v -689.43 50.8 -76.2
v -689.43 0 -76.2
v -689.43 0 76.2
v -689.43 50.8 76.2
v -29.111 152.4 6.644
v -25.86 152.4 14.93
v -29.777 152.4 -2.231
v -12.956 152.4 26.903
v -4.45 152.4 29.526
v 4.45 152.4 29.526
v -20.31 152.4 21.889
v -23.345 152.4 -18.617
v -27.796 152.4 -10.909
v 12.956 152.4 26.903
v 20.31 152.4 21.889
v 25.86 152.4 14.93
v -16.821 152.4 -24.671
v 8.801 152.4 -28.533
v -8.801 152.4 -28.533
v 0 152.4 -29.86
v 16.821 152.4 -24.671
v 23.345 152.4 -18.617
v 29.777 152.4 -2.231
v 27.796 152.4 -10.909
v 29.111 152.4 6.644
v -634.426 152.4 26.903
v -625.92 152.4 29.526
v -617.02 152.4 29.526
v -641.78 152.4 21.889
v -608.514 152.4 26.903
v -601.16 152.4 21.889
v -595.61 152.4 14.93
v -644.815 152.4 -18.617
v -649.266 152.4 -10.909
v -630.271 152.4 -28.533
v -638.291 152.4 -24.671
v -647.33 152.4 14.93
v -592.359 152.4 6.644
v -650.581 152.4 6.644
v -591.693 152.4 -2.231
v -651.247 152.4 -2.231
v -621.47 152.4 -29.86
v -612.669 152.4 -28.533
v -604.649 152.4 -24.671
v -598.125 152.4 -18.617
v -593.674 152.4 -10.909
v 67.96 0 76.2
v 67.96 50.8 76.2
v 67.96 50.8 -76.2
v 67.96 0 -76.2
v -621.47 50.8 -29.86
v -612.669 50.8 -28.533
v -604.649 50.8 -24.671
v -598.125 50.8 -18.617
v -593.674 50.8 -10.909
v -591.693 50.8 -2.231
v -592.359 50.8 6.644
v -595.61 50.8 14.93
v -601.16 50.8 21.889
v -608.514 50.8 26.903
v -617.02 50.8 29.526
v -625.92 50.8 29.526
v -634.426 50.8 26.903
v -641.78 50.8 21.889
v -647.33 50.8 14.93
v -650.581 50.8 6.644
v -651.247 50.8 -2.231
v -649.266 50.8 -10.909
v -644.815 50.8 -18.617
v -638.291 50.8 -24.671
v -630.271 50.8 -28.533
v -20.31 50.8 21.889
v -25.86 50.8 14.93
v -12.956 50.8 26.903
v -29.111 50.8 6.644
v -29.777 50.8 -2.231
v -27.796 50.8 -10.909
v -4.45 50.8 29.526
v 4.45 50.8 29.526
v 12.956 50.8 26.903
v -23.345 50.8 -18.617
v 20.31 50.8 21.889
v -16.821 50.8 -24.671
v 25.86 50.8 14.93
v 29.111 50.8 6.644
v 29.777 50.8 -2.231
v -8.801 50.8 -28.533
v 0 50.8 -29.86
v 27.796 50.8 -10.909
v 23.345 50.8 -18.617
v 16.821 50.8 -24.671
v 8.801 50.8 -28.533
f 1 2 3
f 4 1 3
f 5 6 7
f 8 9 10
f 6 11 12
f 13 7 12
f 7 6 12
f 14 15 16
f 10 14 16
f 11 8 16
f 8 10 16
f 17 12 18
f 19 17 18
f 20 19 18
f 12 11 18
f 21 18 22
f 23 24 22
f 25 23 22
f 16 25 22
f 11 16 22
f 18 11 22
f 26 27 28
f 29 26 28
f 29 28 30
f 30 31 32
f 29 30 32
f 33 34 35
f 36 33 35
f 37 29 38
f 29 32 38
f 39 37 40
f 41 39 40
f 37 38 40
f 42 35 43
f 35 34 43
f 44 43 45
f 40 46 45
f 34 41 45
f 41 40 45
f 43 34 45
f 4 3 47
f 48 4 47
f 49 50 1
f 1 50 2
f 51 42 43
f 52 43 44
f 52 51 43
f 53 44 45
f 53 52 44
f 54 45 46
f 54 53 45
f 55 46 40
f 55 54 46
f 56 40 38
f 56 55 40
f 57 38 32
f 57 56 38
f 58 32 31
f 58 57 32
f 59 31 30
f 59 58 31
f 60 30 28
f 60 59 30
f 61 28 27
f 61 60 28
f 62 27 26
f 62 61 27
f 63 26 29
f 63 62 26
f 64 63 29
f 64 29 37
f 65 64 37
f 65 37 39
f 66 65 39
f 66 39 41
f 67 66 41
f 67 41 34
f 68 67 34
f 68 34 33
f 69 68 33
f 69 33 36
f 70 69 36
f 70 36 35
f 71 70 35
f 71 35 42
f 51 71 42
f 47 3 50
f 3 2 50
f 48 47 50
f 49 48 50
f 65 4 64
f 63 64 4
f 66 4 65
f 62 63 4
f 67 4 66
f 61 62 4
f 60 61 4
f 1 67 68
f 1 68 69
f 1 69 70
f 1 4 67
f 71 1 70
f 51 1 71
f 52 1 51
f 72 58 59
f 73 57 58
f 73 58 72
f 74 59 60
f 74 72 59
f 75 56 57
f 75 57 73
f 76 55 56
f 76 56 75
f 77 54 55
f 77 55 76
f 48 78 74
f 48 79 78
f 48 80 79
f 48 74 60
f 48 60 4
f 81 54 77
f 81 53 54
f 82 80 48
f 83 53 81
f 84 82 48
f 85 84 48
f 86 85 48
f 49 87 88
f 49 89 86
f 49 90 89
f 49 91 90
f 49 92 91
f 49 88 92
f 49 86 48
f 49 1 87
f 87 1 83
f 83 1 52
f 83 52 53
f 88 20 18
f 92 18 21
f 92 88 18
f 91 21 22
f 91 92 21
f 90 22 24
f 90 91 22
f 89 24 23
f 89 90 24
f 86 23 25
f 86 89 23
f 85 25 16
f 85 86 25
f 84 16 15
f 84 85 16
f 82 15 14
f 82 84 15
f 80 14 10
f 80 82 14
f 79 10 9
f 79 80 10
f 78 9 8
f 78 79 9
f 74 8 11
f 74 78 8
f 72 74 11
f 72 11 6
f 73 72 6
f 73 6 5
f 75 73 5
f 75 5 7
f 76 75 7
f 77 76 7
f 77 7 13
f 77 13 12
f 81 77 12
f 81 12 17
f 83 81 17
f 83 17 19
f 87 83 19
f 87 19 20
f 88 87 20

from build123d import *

# Parameters (mm, degrees)
BOSS_EXTRUDE1_DEPTH = 50.8
SKETCH2_R           = 29.86
BOSS_EXTRUDE2_DEPTH = 152.4


with BuildPart() as part:
    # Sketch1 → Boss-Extrude1 (new body)
    with BuildSketch(Plane(origin=(0, 0, 0), x_dir=(1, 0, 0), z_dir=(0, 1, 0))):
        with BuildLine():
            Line((67.96, 0), (29.86, 0))
            ThreePointArc((29.86, 0), (0, -29.86), (-29.86, 0))
            Line((-29.86, 0), (-591.61, 0))
            ThreePointArc((-591.61, 0), (-621.47, -29.86), (-651.33, 0))
            Line((-651.33, 0), (-689.43, 0))
            Line((-689.43, 0), (-689.43, -76.2))
            Line((-689.43, -76.2), (67.96, -76.2))
            Line((67.96, -76.2), (67.96, 0))
        make_face()
        with BuildLine():
            ThreePointArc((-29.86, 0), (0, 29.86), (29.86, 0))
            Line((29.86, 0), (67.96, 0))
            Line((67.96, 0), (67.96, 76.2))
            Line((67.96, 76.2), (-689.43, 76.2))
            Line((-689.43, 76.2), (-689.43, 0))
            Line((-689.43, 0), (-651.33, 0))
            ThreePointArc((-651.33, 0), (-621.47, 29.86), (-591.61, 0))
            Line((-591.61, 0), (-29.86, 0))
        make_face()
    extrude(amount=BOSS_EXTRUDE1_DEPTH)

    # Sketch2 → Boss-Extrude2 (add)
    with BuildSketch(Plane.XZ):
        with Locations(Location((0, 0, 0), (0, 0, 270))):
            Circle(SKETCH2_R)
        with Locations(Location((-621.47, 0, 0), (0, 0, 270))):
            Circle(SKETCH2_R)
    extrude(amount=-BOSS_EXTRUDE2_DEPTH)


solid = part.part
